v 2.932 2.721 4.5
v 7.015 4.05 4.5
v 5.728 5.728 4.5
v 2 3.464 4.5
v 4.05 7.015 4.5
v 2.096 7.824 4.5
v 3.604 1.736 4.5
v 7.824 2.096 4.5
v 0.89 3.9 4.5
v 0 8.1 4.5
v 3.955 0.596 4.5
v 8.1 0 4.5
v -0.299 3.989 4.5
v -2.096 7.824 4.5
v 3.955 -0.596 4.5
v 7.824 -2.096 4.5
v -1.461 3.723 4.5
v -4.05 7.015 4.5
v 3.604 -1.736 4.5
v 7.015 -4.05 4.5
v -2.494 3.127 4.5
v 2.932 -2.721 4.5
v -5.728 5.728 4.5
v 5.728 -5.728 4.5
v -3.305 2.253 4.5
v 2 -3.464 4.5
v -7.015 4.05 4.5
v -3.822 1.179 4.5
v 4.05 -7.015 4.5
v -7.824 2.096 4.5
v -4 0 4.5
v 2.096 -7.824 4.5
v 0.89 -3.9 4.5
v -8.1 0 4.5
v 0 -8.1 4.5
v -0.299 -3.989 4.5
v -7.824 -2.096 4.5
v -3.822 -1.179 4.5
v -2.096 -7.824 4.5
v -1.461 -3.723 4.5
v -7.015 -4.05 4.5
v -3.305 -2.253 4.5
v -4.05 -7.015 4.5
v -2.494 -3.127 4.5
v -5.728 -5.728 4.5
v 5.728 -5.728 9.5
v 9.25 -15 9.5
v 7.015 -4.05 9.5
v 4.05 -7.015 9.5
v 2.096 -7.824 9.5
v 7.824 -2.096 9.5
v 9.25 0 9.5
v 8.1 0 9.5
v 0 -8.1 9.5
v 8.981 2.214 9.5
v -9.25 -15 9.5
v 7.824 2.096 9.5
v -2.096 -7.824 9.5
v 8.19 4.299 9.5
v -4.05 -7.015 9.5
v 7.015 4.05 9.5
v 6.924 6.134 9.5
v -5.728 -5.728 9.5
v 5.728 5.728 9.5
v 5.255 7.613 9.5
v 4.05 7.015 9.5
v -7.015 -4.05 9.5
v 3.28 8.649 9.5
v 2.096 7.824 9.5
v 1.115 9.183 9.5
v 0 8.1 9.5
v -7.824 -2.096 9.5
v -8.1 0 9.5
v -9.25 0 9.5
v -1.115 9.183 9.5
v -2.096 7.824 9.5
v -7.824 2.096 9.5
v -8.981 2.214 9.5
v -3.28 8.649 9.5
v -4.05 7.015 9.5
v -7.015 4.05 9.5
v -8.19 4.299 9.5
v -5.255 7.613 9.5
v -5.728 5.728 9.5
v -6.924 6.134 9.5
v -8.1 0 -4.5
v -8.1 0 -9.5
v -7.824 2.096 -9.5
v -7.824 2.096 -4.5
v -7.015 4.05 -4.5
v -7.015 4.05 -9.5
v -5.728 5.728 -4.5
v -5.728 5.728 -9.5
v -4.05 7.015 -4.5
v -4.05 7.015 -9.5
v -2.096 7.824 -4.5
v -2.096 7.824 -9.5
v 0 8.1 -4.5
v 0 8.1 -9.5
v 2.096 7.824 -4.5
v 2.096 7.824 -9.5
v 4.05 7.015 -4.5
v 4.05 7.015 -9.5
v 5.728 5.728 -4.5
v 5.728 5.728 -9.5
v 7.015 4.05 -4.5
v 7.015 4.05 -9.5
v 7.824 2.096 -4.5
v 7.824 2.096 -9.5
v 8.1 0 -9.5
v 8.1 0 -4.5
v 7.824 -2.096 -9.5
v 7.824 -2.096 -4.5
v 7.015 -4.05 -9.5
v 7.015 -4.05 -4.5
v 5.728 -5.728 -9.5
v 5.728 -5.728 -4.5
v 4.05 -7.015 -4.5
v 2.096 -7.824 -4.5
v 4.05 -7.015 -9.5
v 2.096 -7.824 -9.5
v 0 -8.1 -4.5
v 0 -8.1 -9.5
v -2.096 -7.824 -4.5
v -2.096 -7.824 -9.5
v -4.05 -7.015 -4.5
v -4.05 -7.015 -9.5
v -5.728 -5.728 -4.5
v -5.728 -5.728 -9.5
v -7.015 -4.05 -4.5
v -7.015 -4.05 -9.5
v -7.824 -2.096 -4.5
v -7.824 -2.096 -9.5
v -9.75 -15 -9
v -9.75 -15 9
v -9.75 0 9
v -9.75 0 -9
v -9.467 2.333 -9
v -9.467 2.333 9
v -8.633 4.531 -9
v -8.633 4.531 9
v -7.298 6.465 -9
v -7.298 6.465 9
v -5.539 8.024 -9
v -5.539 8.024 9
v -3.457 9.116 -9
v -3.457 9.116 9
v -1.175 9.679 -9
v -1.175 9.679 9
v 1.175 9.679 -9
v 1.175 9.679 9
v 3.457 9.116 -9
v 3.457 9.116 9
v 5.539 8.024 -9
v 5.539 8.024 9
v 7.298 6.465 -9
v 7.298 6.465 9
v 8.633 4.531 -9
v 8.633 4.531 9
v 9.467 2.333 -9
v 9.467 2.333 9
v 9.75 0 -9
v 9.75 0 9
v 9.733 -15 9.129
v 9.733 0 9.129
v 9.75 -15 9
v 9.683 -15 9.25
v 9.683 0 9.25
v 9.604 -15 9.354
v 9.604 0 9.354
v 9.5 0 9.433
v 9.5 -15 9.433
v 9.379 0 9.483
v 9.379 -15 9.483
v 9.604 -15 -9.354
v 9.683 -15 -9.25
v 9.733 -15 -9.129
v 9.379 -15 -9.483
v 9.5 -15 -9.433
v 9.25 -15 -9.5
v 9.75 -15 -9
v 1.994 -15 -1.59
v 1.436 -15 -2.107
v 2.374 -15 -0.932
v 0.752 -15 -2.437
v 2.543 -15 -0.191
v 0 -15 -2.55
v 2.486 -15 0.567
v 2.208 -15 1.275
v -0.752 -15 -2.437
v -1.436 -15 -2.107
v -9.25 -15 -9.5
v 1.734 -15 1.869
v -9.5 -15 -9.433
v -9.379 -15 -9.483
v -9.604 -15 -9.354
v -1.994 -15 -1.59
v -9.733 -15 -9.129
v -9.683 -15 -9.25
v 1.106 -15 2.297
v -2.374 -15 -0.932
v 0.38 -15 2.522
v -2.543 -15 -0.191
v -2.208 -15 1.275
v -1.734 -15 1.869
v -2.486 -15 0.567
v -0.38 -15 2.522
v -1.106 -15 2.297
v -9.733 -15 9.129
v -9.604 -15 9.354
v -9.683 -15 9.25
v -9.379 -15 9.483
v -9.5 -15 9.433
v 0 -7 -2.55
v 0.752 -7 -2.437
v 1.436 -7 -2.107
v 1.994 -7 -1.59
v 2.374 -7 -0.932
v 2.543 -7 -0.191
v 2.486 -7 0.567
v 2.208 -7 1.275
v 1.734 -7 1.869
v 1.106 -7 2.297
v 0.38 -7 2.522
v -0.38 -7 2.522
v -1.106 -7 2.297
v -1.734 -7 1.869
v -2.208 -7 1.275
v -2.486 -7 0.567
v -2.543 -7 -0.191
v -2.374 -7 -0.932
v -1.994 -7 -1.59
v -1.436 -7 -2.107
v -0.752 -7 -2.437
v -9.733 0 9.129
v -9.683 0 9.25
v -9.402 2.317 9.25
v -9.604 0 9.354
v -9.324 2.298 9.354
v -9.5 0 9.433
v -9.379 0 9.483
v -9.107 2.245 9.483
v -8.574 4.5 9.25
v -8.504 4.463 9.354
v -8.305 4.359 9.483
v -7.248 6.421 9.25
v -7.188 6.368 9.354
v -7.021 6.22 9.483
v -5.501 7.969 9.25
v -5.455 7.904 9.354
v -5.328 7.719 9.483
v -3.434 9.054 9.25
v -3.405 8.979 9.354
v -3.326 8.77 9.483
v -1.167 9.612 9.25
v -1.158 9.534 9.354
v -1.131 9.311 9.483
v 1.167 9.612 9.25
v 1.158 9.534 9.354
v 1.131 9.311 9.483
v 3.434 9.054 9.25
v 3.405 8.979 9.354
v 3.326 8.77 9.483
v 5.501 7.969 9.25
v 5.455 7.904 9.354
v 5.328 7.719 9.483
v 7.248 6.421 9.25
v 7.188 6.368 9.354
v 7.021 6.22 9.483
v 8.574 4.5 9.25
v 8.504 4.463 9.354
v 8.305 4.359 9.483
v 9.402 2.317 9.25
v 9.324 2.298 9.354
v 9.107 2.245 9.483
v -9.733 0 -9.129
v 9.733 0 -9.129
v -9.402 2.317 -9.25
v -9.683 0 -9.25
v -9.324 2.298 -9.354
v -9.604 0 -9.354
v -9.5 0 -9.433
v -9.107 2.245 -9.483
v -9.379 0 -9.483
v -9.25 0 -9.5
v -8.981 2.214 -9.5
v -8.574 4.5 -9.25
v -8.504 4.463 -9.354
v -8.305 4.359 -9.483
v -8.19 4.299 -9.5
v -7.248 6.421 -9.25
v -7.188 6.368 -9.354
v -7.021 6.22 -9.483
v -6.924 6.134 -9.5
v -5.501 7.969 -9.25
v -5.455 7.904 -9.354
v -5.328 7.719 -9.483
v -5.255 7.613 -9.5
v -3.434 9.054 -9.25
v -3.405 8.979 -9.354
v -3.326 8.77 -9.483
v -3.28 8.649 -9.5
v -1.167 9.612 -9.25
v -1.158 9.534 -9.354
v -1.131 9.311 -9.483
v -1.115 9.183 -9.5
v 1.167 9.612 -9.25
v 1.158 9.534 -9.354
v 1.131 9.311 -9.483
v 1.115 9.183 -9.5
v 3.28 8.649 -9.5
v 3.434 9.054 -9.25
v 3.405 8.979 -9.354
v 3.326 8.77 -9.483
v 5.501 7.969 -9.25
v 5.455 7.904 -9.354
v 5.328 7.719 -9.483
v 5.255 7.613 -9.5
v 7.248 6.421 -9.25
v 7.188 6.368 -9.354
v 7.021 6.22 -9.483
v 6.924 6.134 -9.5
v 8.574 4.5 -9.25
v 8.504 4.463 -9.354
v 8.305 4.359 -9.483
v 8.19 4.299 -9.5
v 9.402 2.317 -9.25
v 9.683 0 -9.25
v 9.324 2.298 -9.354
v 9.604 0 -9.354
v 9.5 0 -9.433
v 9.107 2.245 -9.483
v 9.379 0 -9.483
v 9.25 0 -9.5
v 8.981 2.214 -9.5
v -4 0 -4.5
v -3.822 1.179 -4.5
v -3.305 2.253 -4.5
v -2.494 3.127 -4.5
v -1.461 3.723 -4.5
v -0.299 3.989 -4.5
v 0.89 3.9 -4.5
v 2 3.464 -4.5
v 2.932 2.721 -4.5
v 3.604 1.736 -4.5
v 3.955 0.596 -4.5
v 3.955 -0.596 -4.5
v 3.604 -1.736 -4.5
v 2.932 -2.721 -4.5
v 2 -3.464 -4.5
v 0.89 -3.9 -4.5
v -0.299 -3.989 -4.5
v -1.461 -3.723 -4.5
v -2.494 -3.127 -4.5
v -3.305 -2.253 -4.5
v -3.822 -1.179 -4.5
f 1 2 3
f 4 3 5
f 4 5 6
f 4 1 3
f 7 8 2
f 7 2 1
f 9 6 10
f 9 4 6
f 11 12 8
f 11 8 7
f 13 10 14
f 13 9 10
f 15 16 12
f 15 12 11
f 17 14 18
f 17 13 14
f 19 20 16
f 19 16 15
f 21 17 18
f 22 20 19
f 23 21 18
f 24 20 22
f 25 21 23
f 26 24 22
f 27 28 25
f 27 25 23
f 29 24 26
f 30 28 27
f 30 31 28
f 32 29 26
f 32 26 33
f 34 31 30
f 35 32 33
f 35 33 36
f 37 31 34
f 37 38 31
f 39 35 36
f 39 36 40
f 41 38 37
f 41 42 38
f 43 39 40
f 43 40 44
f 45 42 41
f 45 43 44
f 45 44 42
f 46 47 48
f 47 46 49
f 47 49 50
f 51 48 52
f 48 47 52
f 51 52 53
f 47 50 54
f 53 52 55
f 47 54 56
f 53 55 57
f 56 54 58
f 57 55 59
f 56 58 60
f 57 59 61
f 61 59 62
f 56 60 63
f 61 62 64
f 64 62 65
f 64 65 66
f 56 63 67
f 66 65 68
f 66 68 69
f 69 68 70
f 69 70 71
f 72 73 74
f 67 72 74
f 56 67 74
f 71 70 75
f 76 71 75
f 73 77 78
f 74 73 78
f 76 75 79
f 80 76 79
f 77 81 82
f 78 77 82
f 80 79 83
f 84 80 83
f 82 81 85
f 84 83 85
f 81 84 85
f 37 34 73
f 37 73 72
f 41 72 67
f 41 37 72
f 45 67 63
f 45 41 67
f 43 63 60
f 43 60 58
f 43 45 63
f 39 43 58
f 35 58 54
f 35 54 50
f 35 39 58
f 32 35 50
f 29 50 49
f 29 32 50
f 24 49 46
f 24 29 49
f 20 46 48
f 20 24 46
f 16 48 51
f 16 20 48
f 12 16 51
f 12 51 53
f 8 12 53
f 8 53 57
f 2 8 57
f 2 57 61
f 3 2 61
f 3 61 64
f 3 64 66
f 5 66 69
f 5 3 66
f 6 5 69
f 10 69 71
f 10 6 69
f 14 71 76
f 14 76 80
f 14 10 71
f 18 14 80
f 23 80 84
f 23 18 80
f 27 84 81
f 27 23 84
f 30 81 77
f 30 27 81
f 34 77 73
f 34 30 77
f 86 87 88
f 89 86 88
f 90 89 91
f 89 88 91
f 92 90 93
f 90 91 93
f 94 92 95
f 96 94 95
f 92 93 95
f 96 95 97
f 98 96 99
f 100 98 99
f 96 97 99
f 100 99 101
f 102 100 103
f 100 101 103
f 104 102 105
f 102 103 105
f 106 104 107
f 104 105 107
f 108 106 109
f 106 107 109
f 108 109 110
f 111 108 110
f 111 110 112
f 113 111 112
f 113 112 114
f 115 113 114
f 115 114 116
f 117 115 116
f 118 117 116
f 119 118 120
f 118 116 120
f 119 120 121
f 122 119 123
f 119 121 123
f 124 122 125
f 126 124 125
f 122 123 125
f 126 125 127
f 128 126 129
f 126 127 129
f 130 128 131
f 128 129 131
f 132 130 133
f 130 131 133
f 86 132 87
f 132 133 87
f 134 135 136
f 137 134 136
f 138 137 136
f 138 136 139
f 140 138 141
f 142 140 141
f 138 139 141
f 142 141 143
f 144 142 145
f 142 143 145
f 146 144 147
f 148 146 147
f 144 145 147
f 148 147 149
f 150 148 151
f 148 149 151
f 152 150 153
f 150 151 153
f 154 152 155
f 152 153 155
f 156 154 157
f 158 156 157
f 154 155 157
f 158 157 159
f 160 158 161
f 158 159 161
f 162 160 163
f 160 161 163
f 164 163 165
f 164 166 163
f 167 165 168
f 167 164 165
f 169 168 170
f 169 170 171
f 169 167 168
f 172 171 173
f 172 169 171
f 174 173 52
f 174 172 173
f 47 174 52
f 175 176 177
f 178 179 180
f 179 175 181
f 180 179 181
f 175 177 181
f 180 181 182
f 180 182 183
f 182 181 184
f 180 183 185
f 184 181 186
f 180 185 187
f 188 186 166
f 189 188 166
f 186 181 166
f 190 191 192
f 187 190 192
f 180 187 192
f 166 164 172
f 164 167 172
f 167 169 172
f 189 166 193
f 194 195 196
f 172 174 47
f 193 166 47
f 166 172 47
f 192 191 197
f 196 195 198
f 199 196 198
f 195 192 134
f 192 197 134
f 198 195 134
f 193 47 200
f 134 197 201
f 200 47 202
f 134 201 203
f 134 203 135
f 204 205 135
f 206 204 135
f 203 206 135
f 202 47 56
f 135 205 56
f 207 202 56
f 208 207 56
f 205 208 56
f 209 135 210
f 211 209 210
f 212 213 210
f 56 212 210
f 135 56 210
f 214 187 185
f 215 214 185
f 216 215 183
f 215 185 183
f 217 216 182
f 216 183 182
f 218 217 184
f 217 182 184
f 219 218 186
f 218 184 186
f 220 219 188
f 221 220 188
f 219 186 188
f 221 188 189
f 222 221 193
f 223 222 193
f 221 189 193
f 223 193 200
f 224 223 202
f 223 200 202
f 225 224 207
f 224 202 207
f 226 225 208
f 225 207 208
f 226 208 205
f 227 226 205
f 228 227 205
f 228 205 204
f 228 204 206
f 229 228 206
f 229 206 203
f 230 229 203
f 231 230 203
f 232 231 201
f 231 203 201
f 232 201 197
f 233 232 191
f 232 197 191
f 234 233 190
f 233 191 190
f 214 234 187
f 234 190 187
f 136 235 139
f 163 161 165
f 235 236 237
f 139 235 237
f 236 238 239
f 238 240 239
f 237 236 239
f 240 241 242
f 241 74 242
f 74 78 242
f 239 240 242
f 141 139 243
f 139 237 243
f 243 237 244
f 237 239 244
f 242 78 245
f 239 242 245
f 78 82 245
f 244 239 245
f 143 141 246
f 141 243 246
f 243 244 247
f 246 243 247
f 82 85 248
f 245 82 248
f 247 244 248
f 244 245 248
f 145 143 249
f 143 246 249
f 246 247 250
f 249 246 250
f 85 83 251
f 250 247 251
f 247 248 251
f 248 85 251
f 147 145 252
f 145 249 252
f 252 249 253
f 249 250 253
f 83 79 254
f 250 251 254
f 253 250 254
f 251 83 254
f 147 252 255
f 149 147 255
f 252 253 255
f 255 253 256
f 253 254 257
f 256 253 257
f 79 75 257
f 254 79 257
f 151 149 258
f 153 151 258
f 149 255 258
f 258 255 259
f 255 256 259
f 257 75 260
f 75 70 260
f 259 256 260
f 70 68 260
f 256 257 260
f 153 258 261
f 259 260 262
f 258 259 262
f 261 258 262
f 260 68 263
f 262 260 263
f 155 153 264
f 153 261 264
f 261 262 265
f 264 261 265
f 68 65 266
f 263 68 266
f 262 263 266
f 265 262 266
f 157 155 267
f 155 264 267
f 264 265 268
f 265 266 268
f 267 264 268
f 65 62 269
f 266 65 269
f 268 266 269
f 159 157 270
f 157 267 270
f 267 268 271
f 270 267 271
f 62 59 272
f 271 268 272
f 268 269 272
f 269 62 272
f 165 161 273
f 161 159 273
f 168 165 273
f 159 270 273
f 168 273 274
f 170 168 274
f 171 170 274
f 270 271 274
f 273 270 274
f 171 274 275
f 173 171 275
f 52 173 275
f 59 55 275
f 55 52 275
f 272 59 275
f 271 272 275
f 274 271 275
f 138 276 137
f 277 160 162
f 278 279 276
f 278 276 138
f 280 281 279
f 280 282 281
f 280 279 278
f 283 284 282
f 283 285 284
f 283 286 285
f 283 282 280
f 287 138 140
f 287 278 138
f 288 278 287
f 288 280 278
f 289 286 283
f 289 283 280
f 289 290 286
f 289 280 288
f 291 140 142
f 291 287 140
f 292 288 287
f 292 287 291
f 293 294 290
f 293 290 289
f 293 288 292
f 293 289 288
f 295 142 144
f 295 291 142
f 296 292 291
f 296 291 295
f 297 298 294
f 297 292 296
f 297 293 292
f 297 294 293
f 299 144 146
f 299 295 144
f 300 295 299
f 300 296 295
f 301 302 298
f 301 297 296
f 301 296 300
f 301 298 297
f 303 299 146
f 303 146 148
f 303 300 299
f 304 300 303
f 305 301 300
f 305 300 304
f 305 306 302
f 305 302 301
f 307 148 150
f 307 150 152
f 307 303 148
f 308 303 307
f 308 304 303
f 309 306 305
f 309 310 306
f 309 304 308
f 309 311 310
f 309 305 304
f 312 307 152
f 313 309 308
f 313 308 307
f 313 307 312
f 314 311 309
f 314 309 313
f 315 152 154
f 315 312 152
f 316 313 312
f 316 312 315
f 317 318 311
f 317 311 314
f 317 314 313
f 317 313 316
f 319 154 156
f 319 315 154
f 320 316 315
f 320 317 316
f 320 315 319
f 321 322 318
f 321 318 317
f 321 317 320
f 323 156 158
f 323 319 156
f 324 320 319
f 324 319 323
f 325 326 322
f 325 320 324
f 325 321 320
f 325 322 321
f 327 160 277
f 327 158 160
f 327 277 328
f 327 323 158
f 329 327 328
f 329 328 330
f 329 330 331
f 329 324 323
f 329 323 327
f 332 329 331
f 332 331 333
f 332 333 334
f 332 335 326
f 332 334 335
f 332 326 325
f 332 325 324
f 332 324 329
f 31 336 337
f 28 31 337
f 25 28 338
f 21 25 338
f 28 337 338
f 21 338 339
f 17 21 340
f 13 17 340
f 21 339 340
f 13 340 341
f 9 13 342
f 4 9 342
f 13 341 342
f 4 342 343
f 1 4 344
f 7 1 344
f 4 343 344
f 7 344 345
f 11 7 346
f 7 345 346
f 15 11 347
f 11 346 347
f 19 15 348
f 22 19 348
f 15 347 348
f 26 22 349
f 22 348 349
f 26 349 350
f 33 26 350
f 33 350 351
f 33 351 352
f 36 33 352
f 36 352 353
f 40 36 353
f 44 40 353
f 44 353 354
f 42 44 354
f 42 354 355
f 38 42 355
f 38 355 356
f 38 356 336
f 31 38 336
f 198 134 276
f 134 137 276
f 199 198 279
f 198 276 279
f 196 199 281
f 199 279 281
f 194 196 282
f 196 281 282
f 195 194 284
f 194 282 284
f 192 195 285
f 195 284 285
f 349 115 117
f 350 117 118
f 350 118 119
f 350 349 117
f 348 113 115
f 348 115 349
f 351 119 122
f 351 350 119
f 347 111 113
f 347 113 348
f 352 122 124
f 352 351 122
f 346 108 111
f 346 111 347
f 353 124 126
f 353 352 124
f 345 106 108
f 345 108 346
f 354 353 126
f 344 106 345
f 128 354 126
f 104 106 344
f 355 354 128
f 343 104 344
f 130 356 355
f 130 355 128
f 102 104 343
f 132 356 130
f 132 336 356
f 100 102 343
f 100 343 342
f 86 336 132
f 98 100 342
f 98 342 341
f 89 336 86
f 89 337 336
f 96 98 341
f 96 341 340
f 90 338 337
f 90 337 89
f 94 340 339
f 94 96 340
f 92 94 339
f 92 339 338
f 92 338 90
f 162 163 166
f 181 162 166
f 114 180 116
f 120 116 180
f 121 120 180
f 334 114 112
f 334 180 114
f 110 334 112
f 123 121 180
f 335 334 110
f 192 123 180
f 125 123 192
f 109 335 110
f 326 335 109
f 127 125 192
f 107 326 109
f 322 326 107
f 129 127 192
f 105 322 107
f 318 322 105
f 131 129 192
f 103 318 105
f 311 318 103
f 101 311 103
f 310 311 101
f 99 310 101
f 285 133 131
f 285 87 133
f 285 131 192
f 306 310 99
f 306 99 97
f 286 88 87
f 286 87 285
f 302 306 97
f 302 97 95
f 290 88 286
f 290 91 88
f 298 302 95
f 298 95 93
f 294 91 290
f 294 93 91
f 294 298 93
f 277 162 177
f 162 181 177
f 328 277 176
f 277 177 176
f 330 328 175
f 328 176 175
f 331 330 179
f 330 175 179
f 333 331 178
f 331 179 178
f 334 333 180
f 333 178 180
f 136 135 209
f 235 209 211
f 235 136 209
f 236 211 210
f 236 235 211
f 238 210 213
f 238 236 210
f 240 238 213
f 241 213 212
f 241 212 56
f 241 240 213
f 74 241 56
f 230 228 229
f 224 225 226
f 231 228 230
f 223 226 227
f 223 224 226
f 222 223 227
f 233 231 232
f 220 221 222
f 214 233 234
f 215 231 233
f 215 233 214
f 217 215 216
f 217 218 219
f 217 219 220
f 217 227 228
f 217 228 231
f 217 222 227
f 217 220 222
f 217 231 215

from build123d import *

# Parameters (mm, degrees)
BOSS_EXTRUDE2_DEPTH = 9.5
SKETCH4_R           = 4
CUT_EXTRUDE1_DEPTH  = 27.097174177
SKETCH9_R           = 8.1
CUT_EXTRUDE3_DEPTH  = 5
CUT_EXTRUDE4_START  = -5
SKETCH10_R          = 8.1
CUT_EXTRUDE4_DEPTH  = 5
SKETCH12_R          = 2.55
CUT_EXTRUDE6_DEPTH  = 8
FILLET1_R           = 0.5


with BuildPart() as part:
    # Sketch3 → Boss-Extrude2 (new, symmetric)
    with BuildSketch(Plane.XY):
        with BuildLine():
            Line((9.75, 0), (9.75, -15))
            Line((9.75, -15), (-9.75, -15))
            Line((-9.75, -15), (-9.75, 0))
            ThreePointArc((-9.75, 0), (0, 9.75), (9.75, 0))
        make_face()
    extrude(amount=BOSS_EXTRUDE2_DEPTH, both=True)

    # Sketch4 → Cut-Extrude1 (cut, through all)
    with BuildSketch(Plane(origin=(0, 0, -9.5), x_dir=(-1, 0, 0), z_dir=(0, 0, -1))):
        Circle(SKETCH4_R)
    extrude(amount=-CUT_EXTRUDE1_DEPTH, mode=Mode.SUBTRACT)

    # Sketch9 → Cut-Extrude3 (cut)
    with BuildSketch(Plane(origin=(0, 0, -9.5), x_dir=(-1, 0, 0), z_dir=(0, 0, -1))):
        Circle(SKETCH9_R)
    extrude(amount=-CUT_EXTRUDE3_DEPTH, mode=Mode.SUBTRACT)

    # Sketch10 → Cut-Extrude4 (cut)
    with BuildSketch(Plane.XY.offset(9.5).offset(CUT_EXTRUDE4_START)):
        with Locations(Location((0, 0, 0), (0, 0, 180))):
            Circle(SKETCH10_R)
    extrude(amount=CUT_EXTRUDE4_DEPTH, mode=Mode.SUBTRACT)

    # Sketch12 → Cut-Extrude6 (cut)
    with BuildSketch(Plane.XZ.offset(15)):
        with Locations(Location((0, 0, 0), (0, 0, 270))):
            Circle(SKETCH12_R)
    extrude(amount=-CUT_EXTRUDE6_DEPTH, mode=Mode.SUBTRACT)

    # Fillet1
    fillet1_edges = [part.edges().sort_by_distance(p)[0] for p in [
        (9.75, -7.5, 9.5),
        (0, 9.75, 9.5),
        (9.75, -7.5, -9.5),
        (-9.75, -7.5, -9.5),
        (0, 9.75, -9.5),
        (-9.75, -7.5, 9.5),
    ]]
    fillet(fillet1_edges, radius=FILLET1_R)


solid = part.part
